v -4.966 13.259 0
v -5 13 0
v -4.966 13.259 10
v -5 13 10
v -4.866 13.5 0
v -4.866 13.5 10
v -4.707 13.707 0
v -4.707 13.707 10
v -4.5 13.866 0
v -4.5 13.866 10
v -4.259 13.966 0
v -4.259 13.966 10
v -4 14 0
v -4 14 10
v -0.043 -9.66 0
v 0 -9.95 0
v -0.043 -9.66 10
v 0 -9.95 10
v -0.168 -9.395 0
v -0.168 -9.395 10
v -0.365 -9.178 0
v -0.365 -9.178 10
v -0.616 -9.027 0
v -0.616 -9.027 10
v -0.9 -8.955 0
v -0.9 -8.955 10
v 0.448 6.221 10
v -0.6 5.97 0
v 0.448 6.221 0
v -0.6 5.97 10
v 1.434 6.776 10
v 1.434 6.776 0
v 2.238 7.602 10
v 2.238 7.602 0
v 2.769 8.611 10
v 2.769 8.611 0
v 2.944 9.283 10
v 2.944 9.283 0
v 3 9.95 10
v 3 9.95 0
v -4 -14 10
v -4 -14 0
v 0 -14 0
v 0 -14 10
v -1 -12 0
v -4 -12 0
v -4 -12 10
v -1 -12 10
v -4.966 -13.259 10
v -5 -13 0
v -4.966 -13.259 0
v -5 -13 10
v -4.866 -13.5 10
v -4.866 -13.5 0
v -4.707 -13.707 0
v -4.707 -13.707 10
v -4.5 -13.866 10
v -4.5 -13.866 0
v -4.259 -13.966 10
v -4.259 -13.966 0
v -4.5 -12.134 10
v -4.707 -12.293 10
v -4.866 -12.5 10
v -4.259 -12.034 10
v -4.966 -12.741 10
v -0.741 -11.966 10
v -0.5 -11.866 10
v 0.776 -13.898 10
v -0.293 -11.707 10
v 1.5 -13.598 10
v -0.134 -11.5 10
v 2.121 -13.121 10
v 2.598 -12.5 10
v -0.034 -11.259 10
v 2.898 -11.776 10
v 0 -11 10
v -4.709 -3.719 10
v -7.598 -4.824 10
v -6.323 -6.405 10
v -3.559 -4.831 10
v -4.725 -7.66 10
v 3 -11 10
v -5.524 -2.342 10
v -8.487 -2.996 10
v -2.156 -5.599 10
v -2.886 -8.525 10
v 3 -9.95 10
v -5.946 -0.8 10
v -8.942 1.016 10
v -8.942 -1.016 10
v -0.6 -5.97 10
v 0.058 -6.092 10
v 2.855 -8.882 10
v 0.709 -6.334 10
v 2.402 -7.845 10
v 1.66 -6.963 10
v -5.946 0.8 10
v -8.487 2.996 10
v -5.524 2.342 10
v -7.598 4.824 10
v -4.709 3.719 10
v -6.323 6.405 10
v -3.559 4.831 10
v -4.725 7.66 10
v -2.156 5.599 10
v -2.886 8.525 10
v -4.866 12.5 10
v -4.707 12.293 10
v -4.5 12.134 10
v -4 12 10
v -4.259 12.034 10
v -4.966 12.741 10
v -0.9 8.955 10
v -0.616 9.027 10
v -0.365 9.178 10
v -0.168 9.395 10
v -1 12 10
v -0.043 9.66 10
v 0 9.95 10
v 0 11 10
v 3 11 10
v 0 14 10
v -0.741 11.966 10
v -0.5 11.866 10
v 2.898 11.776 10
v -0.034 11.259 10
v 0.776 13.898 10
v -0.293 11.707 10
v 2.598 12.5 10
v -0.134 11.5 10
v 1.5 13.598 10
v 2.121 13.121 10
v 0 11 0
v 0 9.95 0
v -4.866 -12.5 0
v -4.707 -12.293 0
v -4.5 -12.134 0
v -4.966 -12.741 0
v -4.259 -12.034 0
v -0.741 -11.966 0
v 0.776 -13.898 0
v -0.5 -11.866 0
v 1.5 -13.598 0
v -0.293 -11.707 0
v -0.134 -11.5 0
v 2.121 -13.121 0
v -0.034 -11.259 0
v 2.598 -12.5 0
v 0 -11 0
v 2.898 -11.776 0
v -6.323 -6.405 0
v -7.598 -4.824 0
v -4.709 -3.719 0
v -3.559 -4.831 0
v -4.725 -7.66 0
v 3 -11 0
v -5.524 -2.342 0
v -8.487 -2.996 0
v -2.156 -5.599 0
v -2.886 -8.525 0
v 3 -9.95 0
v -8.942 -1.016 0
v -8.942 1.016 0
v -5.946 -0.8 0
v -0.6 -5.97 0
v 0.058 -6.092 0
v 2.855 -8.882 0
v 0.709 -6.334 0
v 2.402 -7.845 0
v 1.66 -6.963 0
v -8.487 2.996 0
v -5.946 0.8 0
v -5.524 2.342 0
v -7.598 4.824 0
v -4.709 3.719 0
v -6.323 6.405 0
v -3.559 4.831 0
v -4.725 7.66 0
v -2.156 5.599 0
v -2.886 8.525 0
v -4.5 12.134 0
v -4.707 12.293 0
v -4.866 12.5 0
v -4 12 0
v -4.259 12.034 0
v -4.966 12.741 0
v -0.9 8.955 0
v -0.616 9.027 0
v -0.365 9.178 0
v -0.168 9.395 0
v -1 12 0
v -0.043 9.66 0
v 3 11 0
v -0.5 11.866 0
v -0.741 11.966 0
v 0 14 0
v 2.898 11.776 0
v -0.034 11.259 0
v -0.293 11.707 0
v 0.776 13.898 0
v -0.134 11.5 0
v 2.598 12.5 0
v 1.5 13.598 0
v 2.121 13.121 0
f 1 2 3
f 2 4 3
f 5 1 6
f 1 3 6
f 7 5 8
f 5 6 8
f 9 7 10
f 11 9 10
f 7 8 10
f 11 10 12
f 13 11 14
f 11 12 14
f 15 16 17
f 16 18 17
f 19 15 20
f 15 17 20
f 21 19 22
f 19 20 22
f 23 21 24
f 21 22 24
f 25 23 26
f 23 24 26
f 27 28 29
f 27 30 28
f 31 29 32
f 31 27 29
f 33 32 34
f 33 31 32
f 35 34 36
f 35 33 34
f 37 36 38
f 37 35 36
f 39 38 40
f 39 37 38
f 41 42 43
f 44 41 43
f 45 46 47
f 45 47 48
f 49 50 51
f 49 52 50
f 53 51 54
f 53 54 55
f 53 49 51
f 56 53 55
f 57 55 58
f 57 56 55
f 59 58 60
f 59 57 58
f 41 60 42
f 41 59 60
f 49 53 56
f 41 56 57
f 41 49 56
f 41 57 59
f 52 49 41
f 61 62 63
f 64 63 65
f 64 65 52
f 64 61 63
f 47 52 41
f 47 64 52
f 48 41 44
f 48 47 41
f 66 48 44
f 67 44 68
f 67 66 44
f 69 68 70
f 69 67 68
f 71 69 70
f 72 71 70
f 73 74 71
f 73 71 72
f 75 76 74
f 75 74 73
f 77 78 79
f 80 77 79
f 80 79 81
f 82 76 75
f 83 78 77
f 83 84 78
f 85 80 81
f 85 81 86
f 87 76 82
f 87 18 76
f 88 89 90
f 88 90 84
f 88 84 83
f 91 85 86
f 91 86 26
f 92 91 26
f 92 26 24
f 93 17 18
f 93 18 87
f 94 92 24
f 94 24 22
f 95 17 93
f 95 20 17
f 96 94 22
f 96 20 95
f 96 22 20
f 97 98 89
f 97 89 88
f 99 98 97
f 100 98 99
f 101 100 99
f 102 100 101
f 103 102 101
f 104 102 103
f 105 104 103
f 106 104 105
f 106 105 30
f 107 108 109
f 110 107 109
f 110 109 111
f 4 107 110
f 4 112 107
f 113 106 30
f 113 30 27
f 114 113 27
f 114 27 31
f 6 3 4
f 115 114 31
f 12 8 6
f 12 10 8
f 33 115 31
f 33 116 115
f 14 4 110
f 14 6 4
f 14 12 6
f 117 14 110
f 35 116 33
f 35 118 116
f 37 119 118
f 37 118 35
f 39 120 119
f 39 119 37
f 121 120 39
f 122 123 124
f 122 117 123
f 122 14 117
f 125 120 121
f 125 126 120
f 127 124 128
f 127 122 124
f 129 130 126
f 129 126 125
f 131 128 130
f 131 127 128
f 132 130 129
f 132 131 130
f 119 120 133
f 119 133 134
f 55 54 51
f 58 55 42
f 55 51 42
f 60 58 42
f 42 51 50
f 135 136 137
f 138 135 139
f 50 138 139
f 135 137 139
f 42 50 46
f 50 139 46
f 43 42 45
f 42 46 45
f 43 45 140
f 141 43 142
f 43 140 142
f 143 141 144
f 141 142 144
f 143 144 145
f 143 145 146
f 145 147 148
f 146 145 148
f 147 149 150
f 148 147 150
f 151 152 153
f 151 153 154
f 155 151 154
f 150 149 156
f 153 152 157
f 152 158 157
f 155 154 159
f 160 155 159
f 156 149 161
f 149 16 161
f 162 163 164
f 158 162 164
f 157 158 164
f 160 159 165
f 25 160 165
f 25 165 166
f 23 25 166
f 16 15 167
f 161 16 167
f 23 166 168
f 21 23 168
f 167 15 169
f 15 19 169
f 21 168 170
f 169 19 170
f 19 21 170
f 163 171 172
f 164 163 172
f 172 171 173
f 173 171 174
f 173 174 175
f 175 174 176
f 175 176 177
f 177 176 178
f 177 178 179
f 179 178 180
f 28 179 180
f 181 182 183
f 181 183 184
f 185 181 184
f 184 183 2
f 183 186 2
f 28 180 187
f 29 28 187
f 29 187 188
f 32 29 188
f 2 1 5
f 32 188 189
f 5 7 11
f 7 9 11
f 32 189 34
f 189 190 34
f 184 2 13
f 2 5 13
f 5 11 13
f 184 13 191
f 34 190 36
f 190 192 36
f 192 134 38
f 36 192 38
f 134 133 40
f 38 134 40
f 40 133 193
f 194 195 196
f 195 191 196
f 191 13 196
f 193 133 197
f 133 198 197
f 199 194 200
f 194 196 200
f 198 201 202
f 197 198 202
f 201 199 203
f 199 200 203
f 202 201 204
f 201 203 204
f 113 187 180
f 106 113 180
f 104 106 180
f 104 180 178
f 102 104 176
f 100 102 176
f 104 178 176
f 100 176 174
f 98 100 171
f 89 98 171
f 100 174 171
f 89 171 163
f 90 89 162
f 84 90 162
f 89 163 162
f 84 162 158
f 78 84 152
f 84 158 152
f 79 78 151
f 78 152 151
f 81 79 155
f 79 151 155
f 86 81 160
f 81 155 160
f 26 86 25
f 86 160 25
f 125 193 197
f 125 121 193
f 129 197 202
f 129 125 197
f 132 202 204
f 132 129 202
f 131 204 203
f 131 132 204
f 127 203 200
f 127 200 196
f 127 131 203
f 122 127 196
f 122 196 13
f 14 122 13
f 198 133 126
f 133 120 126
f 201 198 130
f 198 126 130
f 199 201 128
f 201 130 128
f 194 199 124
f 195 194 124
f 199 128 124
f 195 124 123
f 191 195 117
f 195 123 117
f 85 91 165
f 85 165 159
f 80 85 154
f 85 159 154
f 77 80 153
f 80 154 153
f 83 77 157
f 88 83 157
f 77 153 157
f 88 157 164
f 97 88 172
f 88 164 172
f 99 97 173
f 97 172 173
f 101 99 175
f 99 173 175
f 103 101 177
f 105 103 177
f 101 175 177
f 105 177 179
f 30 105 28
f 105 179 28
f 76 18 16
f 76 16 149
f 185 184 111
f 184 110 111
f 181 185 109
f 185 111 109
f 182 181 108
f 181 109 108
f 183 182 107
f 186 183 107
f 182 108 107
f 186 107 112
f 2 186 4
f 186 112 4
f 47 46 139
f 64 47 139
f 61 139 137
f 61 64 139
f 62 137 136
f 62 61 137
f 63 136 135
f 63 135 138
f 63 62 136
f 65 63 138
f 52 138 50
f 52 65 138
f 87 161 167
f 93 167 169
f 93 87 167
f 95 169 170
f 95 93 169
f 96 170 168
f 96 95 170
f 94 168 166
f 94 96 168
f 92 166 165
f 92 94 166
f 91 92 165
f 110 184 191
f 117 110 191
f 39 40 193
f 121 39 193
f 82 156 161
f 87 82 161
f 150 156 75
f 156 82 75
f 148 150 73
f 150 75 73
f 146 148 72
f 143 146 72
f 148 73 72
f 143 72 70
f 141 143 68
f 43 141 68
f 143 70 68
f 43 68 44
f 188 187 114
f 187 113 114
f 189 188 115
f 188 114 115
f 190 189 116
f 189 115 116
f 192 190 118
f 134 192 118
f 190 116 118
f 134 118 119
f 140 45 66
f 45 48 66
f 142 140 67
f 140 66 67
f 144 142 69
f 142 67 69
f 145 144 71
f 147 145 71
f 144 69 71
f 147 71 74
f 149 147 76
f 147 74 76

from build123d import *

# Parameters (mm, degrees)
F0_W     = 5
F0_H     = 2.0000003874
F1_DEPTH = 10
F2_R     = 4
F3_R     = 3
F4_R     = 1
F5_R     = 1
F6_R     = 1


with BuildPart() as f1:
    # F0 (on Top) → F1 (new body)
    with BuildSketch(Plane.XY):
        with BuildLine():
            ThreePointArc((0, -6), (-6, 0), (0, 6))
            Line((0, 6), (0, 8.9999996126))
            ThreePointArc((0, 8.9999996126), (-8.9999996126, 0), (0, -8.9999996126))
            Line((0, -8.9999996126), (0, -6))
        make_face()
        Polygon((0, 8.9999996126), (0, 6), (3, 6), (3, 14), (0, 14), (0, 11.9999996126), align=None)
        with Locations((-2.5, 12.9999998063)):
            Rectangle(F0_W, F0_H)
        Polygon((3, -6), (0, -6), (0, -8.9999996126), (0, -11.9999996126), (0, -14), (3, -14), align=None)
        with Locations((-2.5, -12.9999998063)):
            Rectangle(F0_W, F0_H)
    extrude(amount=F1_DEPTH)

    # F2
    f2_edges = [f1.edges().sort_by_distance(p)[0] for p in [
        (3, -6, 5),
        (3, 6, 5),
    ]]
    fillet(f2_edges, radius=F2_R)

    # F3
    f3_edges = [f1.edges().sort_by_distance(p)[0] for p in [
        (3, -14, 5),
        (3, 14, 5),
    ]]
    fillet(f3_edges, radius=F3_R)

    # F4
    f4_edges = [f1.edges().sort_by_distance(p)[0] for p in [
        (0, 12, 5),
        (0, -12, 5),
    ]]
    fillet(f4_edges, radius=F4_R)

    # F5
    f5_edges = [f1.edges().sort_by_distance(p)[0] for p in [
        (0, 9, 5),
        (0, -9, 5),
    ]]
    fillet(f5_edges, radius=F5_R)

    # F6
    f6_edges = [f1.edges().sort_by_distance(p)[0] for p in [
        (-5, 12, 5),
        (-5, 14, 5),
        (-5, -12, 5),
        (-5, -14, 5),
    ]]
    fillet(f6_edges, radius=F6_R)


solid = f1.part
